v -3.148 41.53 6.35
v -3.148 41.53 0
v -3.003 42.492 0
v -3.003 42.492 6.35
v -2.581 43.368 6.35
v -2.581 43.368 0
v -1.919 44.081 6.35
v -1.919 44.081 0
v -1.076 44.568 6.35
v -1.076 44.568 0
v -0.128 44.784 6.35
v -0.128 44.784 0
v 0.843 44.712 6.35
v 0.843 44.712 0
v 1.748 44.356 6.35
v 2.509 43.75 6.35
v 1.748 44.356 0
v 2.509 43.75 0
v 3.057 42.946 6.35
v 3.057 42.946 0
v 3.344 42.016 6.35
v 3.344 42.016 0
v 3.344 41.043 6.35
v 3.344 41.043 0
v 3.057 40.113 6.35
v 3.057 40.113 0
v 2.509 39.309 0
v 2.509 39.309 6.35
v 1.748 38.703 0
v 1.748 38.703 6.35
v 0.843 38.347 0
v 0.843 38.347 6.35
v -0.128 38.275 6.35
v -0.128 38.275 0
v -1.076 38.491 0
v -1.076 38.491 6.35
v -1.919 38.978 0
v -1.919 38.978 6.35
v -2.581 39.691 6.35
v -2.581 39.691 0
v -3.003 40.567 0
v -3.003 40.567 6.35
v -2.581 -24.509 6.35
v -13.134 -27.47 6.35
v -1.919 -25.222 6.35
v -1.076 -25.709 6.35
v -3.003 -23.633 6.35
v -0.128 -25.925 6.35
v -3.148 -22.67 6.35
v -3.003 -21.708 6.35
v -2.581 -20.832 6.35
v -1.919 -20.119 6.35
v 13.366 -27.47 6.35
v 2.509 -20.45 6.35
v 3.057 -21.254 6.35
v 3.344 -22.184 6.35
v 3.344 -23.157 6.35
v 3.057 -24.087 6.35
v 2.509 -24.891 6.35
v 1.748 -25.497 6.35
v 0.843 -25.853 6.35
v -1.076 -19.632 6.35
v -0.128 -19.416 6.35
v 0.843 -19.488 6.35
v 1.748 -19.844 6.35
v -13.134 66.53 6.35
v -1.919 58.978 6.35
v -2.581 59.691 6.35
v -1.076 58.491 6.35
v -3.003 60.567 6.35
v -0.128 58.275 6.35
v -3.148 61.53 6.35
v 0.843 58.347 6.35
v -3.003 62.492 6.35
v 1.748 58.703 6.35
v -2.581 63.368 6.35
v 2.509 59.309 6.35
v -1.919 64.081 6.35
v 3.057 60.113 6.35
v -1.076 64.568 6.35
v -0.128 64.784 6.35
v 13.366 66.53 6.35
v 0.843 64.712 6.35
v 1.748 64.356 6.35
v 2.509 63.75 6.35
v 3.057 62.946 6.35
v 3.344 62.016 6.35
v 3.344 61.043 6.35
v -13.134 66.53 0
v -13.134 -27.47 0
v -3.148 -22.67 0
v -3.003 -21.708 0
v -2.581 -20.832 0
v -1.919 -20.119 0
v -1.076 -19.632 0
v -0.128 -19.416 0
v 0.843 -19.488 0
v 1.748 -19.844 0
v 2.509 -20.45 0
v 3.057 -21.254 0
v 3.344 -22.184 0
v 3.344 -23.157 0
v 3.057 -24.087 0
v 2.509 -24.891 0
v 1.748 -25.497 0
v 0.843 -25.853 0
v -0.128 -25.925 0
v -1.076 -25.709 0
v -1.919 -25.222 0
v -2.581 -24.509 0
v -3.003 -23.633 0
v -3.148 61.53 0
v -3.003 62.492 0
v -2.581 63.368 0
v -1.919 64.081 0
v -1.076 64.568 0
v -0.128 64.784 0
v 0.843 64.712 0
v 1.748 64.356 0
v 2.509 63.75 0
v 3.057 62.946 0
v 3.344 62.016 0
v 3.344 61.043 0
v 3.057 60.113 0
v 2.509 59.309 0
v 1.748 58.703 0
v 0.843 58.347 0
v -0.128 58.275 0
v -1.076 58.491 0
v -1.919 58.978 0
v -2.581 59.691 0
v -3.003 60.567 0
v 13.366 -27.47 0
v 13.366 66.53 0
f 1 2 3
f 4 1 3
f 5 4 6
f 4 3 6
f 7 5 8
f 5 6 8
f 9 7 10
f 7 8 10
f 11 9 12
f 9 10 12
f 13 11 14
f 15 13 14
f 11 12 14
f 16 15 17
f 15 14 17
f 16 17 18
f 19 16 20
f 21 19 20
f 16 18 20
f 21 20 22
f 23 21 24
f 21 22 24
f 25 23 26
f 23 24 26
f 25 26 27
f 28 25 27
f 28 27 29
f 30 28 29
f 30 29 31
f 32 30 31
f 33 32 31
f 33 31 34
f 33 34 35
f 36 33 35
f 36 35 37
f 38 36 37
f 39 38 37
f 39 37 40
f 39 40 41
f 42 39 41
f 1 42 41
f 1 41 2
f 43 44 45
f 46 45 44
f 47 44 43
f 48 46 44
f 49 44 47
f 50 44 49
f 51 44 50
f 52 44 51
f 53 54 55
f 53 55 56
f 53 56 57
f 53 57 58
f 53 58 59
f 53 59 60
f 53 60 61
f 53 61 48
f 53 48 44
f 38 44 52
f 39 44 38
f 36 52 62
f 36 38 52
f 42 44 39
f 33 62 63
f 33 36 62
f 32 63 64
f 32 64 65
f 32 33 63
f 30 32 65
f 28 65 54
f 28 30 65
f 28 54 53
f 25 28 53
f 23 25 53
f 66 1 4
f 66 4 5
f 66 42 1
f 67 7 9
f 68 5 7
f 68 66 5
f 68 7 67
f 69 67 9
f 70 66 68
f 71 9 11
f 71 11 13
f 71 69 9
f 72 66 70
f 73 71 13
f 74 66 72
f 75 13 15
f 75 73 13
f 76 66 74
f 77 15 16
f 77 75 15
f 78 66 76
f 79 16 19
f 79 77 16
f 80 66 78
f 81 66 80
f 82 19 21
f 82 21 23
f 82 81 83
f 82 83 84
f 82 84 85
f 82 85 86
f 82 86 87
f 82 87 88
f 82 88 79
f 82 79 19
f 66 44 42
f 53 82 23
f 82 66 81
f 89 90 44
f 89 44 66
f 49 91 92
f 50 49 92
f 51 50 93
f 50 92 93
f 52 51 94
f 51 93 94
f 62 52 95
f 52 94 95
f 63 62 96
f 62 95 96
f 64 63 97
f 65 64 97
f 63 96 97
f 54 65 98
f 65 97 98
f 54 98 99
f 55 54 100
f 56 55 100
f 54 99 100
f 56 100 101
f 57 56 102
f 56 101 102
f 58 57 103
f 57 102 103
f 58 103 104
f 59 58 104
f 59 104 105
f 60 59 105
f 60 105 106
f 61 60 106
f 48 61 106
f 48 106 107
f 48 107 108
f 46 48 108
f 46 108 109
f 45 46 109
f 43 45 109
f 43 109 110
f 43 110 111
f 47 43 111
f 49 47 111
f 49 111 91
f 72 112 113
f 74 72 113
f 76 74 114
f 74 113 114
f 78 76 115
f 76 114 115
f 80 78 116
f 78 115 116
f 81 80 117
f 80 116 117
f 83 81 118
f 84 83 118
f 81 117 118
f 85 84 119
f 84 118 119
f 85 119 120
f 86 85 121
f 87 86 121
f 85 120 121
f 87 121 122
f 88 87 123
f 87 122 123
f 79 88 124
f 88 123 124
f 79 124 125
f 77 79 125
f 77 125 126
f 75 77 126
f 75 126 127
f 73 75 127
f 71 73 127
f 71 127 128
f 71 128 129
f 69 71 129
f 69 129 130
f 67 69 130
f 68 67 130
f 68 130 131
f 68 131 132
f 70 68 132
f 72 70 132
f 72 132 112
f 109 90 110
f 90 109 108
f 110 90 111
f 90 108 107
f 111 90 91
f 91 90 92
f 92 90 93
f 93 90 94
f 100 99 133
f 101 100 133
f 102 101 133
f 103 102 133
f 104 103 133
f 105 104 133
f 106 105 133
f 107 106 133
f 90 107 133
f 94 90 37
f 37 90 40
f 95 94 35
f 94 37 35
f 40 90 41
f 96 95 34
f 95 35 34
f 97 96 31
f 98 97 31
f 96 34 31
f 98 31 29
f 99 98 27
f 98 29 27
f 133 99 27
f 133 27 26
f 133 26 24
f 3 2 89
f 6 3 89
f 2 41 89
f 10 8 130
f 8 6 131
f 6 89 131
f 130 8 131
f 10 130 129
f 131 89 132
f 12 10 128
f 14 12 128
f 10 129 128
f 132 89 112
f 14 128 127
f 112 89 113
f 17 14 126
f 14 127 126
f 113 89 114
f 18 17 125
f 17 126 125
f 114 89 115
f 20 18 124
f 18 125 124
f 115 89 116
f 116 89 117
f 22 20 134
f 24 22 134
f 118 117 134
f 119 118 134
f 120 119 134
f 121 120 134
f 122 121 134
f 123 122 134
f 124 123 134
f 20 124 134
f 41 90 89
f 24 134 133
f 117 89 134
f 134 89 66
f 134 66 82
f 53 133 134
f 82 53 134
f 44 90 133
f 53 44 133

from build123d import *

# Parameters (mm, degrees)
F0_W     = 26.5
F0_H     = 94
F1_DEPTH = 6.35
F3_D     = 6.528


with BuildPart() as f1:
    # F0 (on Top) → F1 (new body)
    with BuildSketch(Plane.XY):
        with Locations((0.116214, 19.529511)):
            Rectangle(F0_W, F0_H)
    extrude(amount=F1_DEPTH)

    # F3 (through all)
    with Locations(Plane.XY.offset(6.35)):
        with Locations((0.116214, 61.529511), (0.116214, 41.529511), (0.116214, -22.670489)):
            Hole(F3_D / 2)


solid = f1.part
